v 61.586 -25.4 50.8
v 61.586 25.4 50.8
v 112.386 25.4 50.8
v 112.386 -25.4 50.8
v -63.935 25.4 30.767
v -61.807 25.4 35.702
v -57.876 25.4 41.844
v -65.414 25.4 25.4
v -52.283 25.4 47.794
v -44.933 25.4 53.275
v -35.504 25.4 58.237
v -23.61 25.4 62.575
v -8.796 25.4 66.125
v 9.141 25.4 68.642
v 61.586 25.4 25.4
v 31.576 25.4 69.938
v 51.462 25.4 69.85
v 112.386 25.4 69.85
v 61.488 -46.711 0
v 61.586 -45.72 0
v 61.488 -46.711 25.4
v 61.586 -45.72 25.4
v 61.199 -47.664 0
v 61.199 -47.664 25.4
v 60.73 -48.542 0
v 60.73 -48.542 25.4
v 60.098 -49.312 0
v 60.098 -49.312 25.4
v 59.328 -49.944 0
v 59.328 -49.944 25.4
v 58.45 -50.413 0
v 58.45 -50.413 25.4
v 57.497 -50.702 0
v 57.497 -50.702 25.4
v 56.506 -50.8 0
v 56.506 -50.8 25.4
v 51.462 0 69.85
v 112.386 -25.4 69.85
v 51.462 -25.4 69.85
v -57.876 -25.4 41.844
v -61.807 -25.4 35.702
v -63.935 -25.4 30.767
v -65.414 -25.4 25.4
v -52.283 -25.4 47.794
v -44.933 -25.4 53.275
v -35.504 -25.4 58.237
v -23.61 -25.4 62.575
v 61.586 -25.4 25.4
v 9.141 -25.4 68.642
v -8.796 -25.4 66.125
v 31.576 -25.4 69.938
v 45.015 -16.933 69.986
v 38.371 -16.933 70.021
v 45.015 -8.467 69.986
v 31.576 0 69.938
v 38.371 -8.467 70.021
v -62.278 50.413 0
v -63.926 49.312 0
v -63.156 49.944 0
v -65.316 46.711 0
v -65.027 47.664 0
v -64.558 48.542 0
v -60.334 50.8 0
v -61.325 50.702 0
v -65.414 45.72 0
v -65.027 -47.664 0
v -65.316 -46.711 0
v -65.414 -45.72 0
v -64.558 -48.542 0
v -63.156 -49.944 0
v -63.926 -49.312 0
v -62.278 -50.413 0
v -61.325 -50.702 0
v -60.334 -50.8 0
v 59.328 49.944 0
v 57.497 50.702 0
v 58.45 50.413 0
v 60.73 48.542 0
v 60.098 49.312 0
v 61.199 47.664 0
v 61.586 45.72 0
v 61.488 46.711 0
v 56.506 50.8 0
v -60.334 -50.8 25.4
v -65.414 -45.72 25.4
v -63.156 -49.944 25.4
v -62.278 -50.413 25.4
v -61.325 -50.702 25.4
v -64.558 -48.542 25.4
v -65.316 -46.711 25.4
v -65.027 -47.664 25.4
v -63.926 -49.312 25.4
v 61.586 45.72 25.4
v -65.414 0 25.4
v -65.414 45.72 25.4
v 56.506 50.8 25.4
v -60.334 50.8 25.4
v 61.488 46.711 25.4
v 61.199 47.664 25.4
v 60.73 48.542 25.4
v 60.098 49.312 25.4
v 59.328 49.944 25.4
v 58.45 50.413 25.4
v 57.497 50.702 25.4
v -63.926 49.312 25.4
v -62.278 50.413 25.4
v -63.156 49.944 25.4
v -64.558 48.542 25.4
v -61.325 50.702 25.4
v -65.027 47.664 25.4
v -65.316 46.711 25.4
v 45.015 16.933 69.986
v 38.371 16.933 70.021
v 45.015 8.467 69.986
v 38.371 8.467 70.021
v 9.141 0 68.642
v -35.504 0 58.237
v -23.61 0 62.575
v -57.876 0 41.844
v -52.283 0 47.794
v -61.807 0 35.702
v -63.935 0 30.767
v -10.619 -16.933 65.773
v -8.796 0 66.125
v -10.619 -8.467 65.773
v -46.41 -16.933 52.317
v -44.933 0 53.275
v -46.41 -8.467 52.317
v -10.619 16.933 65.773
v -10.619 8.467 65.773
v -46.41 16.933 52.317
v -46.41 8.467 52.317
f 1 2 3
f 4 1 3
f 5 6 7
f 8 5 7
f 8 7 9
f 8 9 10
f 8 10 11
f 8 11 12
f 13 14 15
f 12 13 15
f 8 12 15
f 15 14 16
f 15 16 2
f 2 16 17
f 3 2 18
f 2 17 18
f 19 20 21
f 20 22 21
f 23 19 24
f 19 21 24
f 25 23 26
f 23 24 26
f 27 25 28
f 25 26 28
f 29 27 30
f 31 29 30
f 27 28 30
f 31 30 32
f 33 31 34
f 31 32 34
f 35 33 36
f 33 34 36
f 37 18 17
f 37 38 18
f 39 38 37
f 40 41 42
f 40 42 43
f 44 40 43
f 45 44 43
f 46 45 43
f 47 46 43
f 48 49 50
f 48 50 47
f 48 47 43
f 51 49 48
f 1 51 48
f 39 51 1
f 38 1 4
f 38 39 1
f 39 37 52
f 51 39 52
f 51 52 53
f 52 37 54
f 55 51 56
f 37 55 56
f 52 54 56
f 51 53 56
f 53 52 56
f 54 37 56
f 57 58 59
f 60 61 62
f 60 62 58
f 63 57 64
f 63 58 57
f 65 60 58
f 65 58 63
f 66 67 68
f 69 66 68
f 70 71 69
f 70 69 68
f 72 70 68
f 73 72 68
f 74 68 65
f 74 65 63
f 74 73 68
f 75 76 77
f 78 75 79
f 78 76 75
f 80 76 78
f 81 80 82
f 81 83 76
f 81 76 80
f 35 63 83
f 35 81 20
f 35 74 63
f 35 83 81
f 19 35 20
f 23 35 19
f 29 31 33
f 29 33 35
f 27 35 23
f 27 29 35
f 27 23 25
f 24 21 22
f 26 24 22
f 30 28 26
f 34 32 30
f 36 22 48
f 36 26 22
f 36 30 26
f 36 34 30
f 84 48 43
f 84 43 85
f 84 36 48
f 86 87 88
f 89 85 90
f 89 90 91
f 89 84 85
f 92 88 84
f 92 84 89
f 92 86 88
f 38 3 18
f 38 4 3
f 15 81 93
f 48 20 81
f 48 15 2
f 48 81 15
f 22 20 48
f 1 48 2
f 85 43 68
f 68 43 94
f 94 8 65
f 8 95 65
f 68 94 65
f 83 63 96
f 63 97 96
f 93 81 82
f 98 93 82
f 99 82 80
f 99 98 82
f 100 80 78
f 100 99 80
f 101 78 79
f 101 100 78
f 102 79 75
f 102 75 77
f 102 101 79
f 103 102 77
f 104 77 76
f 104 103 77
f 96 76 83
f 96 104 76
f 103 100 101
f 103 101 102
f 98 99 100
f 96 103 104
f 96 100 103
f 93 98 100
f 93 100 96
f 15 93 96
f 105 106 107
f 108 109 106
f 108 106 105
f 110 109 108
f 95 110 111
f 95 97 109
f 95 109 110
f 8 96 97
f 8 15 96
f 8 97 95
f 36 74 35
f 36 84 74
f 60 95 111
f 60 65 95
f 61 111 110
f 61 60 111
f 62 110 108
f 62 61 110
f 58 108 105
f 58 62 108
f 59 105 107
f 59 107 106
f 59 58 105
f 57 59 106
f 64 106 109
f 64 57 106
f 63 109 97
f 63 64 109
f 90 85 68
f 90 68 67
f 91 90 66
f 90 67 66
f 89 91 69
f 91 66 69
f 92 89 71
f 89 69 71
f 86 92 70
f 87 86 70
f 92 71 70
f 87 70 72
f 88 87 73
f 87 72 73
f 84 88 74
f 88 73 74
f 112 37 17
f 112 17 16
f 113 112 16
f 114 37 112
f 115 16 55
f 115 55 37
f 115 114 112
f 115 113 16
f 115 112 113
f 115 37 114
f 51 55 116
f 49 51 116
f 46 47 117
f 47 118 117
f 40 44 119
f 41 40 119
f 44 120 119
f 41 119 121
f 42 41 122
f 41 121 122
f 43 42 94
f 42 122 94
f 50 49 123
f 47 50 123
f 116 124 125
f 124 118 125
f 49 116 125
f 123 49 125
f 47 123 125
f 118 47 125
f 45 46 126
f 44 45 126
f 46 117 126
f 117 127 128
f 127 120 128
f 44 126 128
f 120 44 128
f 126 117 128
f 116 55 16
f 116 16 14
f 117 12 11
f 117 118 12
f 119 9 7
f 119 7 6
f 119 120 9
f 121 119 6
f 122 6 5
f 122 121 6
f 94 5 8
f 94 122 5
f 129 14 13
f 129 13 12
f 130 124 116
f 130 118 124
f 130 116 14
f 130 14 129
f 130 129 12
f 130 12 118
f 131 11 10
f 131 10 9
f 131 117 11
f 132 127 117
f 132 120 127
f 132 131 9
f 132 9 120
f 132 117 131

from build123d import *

# Parameters (mm, degrees)
F1_DEPTH      = 50.8
F1_DEPTH_BACK = 50.8
F2_R          = 5.08
F0_W          = 25.4
F0_H          = 25.4
F3_DEPTH      = 25.4
F3_DEPTH_BACK = 25.4


with BuildPart() as f1:
    # F0 (on Front) → F1 (new body, two sides)
    with BuildSketch(Plane.XZ) as f1_sk:
        Polygon((-65.414091, 25.4), (-65.414091, 0), (61.585909, 0), (61.585909, 25.4), (36.185909, 25.4), (-8.589925, 25.4), align=None)
    extrude(amount=F1_DEPTH)
    extrude(f1_sk.sketch, amount=-F1_DEPTH_BACK)

    # F2
    f2_edges = [f1.edges().sort_by_distance(p)[0] for p in [
        (61.585909, -50.8, 12.7),
        (61.585909, 50.8, 12.7),
        (-65.414091, 50.8, 12.7),
        (-65.414091, -50.8, 12.7),
    ]]
    fillet(f2_edges, radius=F2_R)

    # F0 (on Front) → F3 (join, two sides)
    with BuildSketch(Plane.XZ) as f3_sk:
        Polygon((-65.414091, 25.4), (-65.414091, 0), (61.585909, 0), (61.585909, 25.4), (36.185909, 25.4), (-8.589925, 25.4), align=None)
        with BuildLine():
            add(Edge.make_bspline(
                [(31.575521, 69.937845), (-10.358958, 69.028149), (-58.26536, 60.43693), (-65.414091, 25.4)],
                knots=[17.572505, 17.572505, 17.572505, 17.572505, 125.043548, 125.043548, 125.043548, 125.043548], degree=3))
            Line((-65.414091, 25.4), (-8.589925, 25.4))
            ThreePointArc((-8.589925, 25.4), (2.934524, 55.387008), (31.575521, 69.937845))
        make_face()
        with Locations((48.885909, 38.1)):
            Rectangle(F0_W, F0_H)
        with BuildLine():
            ThreePointArc((31.575521, 69.937845), (2.934524, 55.387008), (-8.589925, 25.4))
            Line((-8.589925, 25.4), (36.185909, 25.4))
            Line((36.185909, 25.4), (36.185909, 50.8))
            Line((36.185909, 50.8), (36.185909, 69.85))
            Line((36.185909, 69.85), (51.462281, 69.85))
            add(Edge.make_bspline(
                [(51.462281, 69.85), (45.129207, 70.029965), (38.432194, 70.086589), (31.575521, 69.937845)],
                knots=[0, 0, 0, 0, 17.572505, 17.572505, 17.572505, 17.572505], degree=3))
        make_face()
        Polygon((36.185909, 50.8), (61.585909, 50.8), (112.385909, 50.8), (112.385909, 69.85), (51.462281, 69.85), (36.185909, 69.85), align=None)
    extrude(amount=F3_DEPTH)
    extrude(f3_sk.sketch, amount=-F3_DEPTH_BACK)


solid = f1.part
